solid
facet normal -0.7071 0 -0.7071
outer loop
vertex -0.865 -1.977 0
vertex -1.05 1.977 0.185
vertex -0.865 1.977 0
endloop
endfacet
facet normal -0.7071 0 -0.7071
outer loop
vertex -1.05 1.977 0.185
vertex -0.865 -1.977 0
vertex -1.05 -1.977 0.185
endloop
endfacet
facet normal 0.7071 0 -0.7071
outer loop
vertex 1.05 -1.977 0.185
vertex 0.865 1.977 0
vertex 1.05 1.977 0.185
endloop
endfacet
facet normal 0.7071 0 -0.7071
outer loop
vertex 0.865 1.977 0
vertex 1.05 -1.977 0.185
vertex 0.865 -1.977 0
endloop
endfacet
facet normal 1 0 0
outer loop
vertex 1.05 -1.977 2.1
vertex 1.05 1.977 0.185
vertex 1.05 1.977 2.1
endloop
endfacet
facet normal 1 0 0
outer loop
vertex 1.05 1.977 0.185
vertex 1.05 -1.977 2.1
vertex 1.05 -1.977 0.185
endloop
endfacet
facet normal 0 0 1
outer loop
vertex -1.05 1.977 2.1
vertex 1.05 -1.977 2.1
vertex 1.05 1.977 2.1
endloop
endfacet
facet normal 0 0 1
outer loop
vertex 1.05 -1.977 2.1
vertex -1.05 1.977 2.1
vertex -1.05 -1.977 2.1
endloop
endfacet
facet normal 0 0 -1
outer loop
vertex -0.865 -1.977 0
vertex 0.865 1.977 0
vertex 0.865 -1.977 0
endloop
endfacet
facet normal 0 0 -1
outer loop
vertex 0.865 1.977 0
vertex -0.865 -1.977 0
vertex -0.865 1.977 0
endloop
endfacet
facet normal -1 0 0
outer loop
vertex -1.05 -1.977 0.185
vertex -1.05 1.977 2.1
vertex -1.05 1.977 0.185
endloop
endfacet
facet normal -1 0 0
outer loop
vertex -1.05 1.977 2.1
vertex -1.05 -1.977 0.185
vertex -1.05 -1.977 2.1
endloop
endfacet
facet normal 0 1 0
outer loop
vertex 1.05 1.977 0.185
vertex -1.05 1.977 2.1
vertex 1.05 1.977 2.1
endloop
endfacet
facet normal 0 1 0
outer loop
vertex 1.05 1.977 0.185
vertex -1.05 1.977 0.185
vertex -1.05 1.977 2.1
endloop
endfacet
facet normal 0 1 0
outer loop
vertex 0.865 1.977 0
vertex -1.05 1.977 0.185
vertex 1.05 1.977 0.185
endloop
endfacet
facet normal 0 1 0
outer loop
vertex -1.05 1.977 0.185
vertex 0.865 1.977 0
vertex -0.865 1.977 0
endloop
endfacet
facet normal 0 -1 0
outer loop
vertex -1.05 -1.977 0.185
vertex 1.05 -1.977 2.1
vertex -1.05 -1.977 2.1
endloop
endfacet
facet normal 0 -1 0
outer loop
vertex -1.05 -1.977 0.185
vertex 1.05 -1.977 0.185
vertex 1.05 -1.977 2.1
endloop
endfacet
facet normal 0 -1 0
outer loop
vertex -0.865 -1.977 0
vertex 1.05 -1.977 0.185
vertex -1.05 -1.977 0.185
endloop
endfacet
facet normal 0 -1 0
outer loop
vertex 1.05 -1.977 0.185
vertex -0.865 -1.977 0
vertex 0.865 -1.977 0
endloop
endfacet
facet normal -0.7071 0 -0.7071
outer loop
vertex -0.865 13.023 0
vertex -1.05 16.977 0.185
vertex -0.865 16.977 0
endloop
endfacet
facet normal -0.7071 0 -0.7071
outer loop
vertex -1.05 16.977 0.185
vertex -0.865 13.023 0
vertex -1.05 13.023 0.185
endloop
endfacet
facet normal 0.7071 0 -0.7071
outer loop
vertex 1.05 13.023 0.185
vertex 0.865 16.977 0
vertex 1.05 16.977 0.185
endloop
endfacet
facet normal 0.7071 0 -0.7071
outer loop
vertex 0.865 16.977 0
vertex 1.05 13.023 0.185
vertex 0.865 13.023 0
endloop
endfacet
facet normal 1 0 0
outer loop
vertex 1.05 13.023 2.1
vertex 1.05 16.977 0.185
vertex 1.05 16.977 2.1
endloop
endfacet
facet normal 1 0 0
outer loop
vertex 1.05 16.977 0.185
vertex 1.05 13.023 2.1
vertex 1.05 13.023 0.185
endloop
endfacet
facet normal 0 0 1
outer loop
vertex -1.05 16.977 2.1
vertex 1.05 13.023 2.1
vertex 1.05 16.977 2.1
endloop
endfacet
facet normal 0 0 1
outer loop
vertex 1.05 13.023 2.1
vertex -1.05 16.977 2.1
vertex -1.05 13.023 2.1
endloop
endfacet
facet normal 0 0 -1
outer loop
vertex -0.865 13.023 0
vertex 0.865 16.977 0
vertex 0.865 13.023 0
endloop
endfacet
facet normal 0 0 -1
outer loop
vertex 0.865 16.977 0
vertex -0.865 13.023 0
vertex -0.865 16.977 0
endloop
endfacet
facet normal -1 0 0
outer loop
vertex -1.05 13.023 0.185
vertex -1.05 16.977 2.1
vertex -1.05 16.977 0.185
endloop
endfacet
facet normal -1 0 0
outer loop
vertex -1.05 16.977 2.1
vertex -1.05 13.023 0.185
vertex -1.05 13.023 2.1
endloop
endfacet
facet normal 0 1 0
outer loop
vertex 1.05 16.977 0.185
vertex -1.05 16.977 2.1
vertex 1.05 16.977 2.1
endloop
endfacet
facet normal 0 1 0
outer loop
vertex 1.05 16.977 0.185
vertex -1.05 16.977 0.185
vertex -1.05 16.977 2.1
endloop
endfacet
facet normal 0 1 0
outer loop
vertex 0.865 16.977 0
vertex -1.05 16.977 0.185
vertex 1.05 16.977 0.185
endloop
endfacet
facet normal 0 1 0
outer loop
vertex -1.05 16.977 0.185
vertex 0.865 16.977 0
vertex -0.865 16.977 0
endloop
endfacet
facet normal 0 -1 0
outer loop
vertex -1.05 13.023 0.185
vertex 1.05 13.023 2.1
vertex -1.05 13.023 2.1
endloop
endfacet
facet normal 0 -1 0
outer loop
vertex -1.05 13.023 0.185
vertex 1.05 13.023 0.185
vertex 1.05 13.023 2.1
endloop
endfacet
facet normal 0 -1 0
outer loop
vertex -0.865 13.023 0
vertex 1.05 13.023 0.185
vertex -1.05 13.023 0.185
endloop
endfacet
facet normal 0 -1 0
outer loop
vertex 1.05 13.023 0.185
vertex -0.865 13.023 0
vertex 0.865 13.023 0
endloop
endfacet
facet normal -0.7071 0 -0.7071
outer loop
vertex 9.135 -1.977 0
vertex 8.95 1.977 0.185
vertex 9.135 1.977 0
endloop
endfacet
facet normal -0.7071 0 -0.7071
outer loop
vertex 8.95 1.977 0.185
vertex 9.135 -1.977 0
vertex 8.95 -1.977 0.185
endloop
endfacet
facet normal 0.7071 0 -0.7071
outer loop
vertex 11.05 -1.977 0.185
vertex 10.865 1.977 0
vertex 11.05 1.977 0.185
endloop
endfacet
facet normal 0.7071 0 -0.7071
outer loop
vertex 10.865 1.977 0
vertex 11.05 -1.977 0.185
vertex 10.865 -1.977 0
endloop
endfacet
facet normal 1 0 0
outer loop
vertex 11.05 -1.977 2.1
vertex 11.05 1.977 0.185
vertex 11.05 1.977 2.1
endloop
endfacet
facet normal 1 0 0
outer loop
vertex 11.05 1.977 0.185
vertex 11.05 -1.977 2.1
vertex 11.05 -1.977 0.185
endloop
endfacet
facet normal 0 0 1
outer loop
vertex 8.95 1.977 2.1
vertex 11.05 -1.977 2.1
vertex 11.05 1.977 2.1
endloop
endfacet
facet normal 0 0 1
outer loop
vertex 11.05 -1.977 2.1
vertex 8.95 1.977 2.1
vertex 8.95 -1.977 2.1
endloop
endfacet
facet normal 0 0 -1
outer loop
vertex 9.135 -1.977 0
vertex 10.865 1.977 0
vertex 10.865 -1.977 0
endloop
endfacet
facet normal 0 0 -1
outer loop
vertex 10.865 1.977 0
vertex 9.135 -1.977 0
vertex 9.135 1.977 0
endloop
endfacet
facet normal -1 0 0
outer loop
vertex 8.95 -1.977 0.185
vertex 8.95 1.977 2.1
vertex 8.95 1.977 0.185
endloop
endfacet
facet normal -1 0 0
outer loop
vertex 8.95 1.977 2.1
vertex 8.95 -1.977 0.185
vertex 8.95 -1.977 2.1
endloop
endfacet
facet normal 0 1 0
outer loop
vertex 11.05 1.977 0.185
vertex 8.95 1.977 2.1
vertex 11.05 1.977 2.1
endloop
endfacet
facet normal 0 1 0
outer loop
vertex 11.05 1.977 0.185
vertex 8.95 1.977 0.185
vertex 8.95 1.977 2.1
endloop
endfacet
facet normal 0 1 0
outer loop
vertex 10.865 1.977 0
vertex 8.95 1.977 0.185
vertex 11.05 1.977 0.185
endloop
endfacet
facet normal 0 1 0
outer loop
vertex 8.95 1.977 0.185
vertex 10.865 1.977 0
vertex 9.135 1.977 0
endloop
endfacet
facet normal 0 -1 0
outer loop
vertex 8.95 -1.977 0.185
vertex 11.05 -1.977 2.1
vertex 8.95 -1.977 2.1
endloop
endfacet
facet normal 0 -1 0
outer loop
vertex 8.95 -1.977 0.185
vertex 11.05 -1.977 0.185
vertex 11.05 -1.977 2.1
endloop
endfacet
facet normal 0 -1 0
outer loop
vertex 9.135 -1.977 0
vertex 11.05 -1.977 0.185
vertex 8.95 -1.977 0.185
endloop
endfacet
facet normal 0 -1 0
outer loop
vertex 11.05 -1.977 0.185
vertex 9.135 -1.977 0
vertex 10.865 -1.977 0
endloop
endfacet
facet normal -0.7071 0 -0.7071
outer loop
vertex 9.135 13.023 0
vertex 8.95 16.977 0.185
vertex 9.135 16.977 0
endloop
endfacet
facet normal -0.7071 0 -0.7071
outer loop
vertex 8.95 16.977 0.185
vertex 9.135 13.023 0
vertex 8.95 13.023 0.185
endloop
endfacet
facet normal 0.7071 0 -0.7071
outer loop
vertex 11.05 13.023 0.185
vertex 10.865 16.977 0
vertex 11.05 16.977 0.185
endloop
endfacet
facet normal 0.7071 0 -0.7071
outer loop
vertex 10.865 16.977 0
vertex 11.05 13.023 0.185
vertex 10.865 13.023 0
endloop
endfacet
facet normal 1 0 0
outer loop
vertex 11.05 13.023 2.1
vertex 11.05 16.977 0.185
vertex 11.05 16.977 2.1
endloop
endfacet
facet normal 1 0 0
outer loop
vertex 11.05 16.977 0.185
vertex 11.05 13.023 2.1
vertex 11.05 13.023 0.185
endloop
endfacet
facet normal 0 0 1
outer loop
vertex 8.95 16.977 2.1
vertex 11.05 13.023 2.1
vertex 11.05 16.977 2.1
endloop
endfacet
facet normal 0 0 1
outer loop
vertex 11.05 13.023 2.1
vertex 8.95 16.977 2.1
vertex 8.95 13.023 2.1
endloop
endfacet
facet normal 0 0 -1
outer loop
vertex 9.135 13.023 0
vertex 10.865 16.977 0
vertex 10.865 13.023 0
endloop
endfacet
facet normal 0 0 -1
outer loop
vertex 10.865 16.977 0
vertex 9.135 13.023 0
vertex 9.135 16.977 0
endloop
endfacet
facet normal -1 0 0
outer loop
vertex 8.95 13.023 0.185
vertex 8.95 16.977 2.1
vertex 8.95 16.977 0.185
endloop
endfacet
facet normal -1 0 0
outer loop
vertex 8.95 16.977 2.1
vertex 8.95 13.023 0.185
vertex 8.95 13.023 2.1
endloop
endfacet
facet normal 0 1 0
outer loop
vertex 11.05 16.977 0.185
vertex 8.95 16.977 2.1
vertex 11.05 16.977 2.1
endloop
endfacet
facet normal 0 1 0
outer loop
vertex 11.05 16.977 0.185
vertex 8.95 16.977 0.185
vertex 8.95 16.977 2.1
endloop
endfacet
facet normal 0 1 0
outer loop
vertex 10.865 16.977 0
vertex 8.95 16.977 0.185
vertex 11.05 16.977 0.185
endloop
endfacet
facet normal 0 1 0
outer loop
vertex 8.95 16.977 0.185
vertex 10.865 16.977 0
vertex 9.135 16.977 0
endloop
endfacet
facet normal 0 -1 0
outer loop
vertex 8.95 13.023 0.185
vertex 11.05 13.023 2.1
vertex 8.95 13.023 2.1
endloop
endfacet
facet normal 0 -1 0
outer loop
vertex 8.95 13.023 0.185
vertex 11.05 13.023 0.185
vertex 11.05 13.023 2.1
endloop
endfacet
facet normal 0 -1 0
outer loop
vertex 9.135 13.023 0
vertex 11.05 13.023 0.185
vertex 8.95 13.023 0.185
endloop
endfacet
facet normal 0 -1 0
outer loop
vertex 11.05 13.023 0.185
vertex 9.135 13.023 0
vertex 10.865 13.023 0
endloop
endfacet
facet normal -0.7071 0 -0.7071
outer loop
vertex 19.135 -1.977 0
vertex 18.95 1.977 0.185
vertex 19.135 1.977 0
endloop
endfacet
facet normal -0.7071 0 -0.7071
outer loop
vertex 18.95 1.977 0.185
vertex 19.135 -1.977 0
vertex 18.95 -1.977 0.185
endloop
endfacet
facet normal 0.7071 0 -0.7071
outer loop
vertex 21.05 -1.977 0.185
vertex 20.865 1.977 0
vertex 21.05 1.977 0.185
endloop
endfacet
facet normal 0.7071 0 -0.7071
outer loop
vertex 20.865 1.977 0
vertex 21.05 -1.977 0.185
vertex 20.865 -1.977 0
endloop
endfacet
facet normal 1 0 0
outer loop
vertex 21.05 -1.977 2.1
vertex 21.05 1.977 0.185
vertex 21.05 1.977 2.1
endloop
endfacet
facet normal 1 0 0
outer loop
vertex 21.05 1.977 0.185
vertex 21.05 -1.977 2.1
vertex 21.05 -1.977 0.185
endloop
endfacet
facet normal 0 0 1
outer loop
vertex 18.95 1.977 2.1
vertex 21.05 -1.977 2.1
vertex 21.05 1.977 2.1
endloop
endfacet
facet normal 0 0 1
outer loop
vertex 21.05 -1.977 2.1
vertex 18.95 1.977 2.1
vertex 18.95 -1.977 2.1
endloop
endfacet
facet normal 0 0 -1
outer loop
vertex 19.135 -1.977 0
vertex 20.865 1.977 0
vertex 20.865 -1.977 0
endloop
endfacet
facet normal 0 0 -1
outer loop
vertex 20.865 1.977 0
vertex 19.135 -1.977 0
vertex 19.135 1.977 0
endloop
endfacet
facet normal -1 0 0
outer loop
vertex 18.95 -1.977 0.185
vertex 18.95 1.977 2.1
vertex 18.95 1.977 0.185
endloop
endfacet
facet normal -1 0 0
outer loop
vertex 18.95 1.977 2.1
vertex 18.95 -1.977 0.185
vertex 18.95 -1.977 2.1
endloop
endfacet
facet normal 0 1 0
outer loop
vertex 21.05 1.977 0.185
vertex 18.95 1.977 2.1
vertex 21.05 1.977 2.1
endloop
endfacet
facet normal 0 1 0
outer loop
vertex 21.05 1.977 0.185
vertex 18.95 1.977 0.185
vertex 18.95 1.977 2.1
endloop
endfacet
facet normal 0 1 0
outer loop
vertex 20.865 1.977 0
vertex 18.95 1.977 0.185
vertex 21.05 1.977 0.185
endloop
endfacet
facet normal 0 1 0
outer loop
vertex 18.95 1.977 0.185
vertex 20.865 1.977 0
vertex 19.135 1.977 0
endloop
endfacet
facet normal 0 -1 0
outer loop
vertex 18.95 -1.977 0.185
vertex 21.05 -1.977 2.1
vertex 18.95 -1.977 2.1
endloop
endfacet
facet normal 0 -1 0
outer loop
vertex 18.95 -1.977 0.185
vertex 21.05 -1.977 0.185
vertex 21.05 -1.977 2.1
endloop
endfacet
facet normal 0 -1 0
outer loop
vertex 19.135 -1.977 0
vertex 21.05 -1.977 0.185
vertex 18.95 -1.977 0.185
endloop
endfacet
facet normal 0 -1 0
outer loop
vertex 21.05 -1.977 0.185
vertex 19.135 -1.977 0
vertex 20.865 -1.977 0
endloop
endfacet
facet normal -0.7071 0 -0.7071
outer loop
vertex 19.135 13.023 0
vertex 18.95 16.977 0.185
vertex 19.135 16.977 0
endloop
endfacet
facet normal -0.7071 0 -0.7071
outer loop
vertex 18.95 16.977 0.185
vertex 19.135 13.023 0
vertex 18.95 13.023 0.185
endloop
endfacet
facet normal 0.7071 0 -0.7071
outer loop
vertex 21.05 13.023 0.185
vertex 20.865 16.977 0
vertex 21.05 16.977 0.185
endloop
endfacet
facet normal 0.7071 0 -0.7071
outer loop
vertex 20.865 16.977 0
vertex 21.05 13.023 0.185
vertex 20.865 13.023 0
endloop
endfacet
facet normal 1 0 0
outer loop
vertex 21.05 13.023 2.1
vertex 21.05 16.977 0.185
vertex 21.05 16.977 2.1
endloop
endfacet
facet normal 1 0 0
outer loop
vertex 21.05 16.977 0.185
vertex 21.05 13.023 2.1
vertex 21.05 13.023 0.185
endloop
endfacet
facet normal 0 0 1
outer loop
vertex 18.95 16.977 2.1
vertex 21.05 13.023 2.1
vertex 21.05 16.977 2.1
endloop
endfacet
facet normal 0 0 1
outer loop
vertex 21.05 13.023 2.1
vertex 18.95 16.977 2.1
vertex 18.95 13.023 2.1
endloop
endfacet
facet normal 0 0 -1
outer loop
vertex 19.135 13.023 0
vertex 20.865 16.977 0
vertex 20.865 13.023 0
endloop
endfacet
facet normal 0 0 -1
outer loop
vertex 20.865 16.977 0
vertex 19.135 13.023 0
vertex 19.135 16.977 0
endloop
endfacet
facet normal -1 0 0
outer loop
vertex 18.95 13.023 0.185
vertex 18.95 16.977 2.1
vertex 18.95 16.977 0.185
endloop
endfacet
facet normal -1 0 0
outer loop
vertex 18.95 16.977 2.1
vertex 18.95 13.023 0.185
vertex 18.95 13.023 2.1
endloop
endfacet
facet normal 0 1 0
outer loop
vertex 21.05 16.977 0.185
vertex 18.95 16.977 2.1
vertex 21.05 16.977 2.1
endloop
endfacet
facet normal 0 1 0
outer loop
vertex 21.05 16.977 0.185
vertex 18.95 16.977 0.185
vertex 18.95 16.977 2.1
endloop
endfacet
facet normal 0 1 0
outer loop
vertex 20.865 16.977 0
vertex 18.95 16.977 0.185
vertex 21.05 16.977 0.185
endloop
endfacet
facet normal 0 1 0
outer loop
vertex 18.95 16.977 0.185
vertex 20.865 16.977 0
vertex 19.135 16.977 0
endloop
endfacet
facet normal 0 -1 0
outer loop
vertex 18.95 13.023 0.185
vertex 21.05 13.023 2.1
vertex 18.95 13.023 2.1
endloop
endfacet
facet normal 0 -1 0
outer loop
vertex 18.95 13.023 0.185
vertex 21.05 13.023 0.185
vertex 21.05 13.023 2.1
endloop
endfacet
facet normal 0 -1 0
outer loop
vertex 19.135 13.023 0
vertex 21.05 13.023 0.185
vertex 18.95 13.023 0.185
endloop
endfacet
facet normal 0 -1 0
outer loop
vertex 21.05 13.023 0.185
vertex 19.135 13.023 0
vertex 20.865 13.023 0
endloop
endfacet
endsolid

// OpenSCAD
// file: common.scad
// Unless otherwise specified, each resulting shape is
// resting on the XY plane, centered on the Z axis.

// A small amount to make sure shapes overlap when needed. This
// is well below the resolution of my 3D printer, so it
// shouldn't affect the final result.
eps = 0.001;

// High quality for printing.
$fa = 5;
$fs = 0.4;

module repeatx(n, spacing) {
  for (i = [1:n])
    translate([(i-1)*spacing, 0, 0])
      children();
}

module repeaty(n, spacing) {
  for (i = [1:n])
    translate([0, (i-1)*spacing, 0])
      children();
}

// A square pyramid, 1mm wide and 0.5mm tall. Each side of
// the base is centered on an axis.
module pyramid() {
  linear_extrude(0.5, scale=0)
    square(1, center=true);
}

// A regular octahedron centered on the origin with its
// vertices on the axes. 'axis' gives its full length along
// each axis.
module octahedron(axis) {
  // Top and bottom halves.
  for (a = [-1, 1])
    scale([1, 1, a])
      // Extrude a square into a pyramid.
      linear_extrude(axis/2, scale=0)
        rotate([0, 0, 45])
          square(norm([axis/2, axis/2]), center=true);
}

// 'd' is the outer dimensions of the box.
module chamfered_box(d, chamfer=0.5) {
  assert(d.x >= chamfer*2);
  assert(d.y >= chamfer*2);
  assert(d.z >= chamfer*2);

  // Raise the result up so it is resting on the XY plane.
  translate([0, 0, d.z/2]) {
    minkowski() {
      // The desired cube, scaled back by the chamfer distance
      // in all directions.
      cube(d - [chamfer*2, chamfer*2, chamfer*2], center=true);
      octahedron(chamfer*2);
    }
  }
}

module chamfered_disk(height, radius) {
  // Chamfer base disks and chips more aggressively.
  chamfer = 1.1;
  assert(radius >= chamfer);
  assert(height >= chamfer*2);

  // Raise the result up so it is resting on the XY plane.
  translate([0, 0, height/2]) {
    minkowski() {
      // The desired disk, scaled back by the chamfer distance
      // in all directions.
      cylinder(height-chamfer*2, r=radius-chamfer, center=true);
      
      // A pair of cones.
      for (a = [-1, 1])
        scale([1, 1, a])
          linear_extrude(chamfer, scale=0)
            circle(chamfer);
    }
  }
}

locking_lug_dims = [2.3, 2.3, 1.8+2*eps];

// A snug fit for gluing.
module locking_lug() {
  // Taper the lug slightly, to counteract the printing effect
  // which spreads the top layer slightly.
  linear_extrude(locking_lug_dims.z, scale=0.95)
    square([locking_lug_dims.x, locking_lug_dims.y],
            center=true);
}

// Make extra sure the lug will fit all the way into the hole.
locking_socket_extra_depth = 0.7;

module locking_socket_top() {
  extra_depth = 0.15;
  translate([
    0, 0,
    -(
       locking_lug_dims.z+locking_socket_extra_depth+extra_depth
    )/2+eps
  ]) {
    cube(locking_lug_dims + [
      0.15, 0.15,
      locking_socket_extra_depth+extra_depth
    ], center=true);
  }
}

module locking_socket_bottom() {
  translate([
    0, 0,
    (locking_lug_dims.z+locking_socket_extra_depth)/2-eps
  ]) {
    cube(locking_lug_dims + [
      // When printing this on the bottom of a model, it
      // needs to be a bit wider to account for
      // elephant-foot.
      0.3, 0.3,
      locking_socket_extra_depth
    ], center=true);
  }
}

// A pin which can be used to join two locking sockets.
module locking_pin() {
  dims = [
    locking_lug_dims.x-0.2,
    // Lay the pin on its side for more reliable printing.
    locking_lug_dims.z*2 + locking_socket_extra_depth/2,
    locking_lug_dims.y-0.2,
  ];
  translate([0, 0, dims.z/2]) {
    difference() {
      cube(dims, center=true);
      
      // A slight bottom chamfer to combat elephant-foot.
      for (a = [-1, 1])
        scale([a, 1, 1])
          translate([dims.x/2, -eps, -dims.z/2-1.3])
            rotate([0, 45, 0])
              cube([dims.x, dims.y+3*eps, dims.z], center=true);
    }
  }
}

// Arranges children in square pattern.
module arrange(spacing) {
  s = ceil(sqrt($children));
  for (a = [0:s-1], b = [0:s-1]) {
    c = a + b*s;
    x = a - s/2 + 0.5;
    y = b - s/2 + 0.5;
    if (c < $children)
      translate([x*spacing, y*spacing, 0])
        children(c);
  }
}
// main file
use <common.scad>

repeatx(3, 10)
  repeaty(2, 15)
    locking_pin();
